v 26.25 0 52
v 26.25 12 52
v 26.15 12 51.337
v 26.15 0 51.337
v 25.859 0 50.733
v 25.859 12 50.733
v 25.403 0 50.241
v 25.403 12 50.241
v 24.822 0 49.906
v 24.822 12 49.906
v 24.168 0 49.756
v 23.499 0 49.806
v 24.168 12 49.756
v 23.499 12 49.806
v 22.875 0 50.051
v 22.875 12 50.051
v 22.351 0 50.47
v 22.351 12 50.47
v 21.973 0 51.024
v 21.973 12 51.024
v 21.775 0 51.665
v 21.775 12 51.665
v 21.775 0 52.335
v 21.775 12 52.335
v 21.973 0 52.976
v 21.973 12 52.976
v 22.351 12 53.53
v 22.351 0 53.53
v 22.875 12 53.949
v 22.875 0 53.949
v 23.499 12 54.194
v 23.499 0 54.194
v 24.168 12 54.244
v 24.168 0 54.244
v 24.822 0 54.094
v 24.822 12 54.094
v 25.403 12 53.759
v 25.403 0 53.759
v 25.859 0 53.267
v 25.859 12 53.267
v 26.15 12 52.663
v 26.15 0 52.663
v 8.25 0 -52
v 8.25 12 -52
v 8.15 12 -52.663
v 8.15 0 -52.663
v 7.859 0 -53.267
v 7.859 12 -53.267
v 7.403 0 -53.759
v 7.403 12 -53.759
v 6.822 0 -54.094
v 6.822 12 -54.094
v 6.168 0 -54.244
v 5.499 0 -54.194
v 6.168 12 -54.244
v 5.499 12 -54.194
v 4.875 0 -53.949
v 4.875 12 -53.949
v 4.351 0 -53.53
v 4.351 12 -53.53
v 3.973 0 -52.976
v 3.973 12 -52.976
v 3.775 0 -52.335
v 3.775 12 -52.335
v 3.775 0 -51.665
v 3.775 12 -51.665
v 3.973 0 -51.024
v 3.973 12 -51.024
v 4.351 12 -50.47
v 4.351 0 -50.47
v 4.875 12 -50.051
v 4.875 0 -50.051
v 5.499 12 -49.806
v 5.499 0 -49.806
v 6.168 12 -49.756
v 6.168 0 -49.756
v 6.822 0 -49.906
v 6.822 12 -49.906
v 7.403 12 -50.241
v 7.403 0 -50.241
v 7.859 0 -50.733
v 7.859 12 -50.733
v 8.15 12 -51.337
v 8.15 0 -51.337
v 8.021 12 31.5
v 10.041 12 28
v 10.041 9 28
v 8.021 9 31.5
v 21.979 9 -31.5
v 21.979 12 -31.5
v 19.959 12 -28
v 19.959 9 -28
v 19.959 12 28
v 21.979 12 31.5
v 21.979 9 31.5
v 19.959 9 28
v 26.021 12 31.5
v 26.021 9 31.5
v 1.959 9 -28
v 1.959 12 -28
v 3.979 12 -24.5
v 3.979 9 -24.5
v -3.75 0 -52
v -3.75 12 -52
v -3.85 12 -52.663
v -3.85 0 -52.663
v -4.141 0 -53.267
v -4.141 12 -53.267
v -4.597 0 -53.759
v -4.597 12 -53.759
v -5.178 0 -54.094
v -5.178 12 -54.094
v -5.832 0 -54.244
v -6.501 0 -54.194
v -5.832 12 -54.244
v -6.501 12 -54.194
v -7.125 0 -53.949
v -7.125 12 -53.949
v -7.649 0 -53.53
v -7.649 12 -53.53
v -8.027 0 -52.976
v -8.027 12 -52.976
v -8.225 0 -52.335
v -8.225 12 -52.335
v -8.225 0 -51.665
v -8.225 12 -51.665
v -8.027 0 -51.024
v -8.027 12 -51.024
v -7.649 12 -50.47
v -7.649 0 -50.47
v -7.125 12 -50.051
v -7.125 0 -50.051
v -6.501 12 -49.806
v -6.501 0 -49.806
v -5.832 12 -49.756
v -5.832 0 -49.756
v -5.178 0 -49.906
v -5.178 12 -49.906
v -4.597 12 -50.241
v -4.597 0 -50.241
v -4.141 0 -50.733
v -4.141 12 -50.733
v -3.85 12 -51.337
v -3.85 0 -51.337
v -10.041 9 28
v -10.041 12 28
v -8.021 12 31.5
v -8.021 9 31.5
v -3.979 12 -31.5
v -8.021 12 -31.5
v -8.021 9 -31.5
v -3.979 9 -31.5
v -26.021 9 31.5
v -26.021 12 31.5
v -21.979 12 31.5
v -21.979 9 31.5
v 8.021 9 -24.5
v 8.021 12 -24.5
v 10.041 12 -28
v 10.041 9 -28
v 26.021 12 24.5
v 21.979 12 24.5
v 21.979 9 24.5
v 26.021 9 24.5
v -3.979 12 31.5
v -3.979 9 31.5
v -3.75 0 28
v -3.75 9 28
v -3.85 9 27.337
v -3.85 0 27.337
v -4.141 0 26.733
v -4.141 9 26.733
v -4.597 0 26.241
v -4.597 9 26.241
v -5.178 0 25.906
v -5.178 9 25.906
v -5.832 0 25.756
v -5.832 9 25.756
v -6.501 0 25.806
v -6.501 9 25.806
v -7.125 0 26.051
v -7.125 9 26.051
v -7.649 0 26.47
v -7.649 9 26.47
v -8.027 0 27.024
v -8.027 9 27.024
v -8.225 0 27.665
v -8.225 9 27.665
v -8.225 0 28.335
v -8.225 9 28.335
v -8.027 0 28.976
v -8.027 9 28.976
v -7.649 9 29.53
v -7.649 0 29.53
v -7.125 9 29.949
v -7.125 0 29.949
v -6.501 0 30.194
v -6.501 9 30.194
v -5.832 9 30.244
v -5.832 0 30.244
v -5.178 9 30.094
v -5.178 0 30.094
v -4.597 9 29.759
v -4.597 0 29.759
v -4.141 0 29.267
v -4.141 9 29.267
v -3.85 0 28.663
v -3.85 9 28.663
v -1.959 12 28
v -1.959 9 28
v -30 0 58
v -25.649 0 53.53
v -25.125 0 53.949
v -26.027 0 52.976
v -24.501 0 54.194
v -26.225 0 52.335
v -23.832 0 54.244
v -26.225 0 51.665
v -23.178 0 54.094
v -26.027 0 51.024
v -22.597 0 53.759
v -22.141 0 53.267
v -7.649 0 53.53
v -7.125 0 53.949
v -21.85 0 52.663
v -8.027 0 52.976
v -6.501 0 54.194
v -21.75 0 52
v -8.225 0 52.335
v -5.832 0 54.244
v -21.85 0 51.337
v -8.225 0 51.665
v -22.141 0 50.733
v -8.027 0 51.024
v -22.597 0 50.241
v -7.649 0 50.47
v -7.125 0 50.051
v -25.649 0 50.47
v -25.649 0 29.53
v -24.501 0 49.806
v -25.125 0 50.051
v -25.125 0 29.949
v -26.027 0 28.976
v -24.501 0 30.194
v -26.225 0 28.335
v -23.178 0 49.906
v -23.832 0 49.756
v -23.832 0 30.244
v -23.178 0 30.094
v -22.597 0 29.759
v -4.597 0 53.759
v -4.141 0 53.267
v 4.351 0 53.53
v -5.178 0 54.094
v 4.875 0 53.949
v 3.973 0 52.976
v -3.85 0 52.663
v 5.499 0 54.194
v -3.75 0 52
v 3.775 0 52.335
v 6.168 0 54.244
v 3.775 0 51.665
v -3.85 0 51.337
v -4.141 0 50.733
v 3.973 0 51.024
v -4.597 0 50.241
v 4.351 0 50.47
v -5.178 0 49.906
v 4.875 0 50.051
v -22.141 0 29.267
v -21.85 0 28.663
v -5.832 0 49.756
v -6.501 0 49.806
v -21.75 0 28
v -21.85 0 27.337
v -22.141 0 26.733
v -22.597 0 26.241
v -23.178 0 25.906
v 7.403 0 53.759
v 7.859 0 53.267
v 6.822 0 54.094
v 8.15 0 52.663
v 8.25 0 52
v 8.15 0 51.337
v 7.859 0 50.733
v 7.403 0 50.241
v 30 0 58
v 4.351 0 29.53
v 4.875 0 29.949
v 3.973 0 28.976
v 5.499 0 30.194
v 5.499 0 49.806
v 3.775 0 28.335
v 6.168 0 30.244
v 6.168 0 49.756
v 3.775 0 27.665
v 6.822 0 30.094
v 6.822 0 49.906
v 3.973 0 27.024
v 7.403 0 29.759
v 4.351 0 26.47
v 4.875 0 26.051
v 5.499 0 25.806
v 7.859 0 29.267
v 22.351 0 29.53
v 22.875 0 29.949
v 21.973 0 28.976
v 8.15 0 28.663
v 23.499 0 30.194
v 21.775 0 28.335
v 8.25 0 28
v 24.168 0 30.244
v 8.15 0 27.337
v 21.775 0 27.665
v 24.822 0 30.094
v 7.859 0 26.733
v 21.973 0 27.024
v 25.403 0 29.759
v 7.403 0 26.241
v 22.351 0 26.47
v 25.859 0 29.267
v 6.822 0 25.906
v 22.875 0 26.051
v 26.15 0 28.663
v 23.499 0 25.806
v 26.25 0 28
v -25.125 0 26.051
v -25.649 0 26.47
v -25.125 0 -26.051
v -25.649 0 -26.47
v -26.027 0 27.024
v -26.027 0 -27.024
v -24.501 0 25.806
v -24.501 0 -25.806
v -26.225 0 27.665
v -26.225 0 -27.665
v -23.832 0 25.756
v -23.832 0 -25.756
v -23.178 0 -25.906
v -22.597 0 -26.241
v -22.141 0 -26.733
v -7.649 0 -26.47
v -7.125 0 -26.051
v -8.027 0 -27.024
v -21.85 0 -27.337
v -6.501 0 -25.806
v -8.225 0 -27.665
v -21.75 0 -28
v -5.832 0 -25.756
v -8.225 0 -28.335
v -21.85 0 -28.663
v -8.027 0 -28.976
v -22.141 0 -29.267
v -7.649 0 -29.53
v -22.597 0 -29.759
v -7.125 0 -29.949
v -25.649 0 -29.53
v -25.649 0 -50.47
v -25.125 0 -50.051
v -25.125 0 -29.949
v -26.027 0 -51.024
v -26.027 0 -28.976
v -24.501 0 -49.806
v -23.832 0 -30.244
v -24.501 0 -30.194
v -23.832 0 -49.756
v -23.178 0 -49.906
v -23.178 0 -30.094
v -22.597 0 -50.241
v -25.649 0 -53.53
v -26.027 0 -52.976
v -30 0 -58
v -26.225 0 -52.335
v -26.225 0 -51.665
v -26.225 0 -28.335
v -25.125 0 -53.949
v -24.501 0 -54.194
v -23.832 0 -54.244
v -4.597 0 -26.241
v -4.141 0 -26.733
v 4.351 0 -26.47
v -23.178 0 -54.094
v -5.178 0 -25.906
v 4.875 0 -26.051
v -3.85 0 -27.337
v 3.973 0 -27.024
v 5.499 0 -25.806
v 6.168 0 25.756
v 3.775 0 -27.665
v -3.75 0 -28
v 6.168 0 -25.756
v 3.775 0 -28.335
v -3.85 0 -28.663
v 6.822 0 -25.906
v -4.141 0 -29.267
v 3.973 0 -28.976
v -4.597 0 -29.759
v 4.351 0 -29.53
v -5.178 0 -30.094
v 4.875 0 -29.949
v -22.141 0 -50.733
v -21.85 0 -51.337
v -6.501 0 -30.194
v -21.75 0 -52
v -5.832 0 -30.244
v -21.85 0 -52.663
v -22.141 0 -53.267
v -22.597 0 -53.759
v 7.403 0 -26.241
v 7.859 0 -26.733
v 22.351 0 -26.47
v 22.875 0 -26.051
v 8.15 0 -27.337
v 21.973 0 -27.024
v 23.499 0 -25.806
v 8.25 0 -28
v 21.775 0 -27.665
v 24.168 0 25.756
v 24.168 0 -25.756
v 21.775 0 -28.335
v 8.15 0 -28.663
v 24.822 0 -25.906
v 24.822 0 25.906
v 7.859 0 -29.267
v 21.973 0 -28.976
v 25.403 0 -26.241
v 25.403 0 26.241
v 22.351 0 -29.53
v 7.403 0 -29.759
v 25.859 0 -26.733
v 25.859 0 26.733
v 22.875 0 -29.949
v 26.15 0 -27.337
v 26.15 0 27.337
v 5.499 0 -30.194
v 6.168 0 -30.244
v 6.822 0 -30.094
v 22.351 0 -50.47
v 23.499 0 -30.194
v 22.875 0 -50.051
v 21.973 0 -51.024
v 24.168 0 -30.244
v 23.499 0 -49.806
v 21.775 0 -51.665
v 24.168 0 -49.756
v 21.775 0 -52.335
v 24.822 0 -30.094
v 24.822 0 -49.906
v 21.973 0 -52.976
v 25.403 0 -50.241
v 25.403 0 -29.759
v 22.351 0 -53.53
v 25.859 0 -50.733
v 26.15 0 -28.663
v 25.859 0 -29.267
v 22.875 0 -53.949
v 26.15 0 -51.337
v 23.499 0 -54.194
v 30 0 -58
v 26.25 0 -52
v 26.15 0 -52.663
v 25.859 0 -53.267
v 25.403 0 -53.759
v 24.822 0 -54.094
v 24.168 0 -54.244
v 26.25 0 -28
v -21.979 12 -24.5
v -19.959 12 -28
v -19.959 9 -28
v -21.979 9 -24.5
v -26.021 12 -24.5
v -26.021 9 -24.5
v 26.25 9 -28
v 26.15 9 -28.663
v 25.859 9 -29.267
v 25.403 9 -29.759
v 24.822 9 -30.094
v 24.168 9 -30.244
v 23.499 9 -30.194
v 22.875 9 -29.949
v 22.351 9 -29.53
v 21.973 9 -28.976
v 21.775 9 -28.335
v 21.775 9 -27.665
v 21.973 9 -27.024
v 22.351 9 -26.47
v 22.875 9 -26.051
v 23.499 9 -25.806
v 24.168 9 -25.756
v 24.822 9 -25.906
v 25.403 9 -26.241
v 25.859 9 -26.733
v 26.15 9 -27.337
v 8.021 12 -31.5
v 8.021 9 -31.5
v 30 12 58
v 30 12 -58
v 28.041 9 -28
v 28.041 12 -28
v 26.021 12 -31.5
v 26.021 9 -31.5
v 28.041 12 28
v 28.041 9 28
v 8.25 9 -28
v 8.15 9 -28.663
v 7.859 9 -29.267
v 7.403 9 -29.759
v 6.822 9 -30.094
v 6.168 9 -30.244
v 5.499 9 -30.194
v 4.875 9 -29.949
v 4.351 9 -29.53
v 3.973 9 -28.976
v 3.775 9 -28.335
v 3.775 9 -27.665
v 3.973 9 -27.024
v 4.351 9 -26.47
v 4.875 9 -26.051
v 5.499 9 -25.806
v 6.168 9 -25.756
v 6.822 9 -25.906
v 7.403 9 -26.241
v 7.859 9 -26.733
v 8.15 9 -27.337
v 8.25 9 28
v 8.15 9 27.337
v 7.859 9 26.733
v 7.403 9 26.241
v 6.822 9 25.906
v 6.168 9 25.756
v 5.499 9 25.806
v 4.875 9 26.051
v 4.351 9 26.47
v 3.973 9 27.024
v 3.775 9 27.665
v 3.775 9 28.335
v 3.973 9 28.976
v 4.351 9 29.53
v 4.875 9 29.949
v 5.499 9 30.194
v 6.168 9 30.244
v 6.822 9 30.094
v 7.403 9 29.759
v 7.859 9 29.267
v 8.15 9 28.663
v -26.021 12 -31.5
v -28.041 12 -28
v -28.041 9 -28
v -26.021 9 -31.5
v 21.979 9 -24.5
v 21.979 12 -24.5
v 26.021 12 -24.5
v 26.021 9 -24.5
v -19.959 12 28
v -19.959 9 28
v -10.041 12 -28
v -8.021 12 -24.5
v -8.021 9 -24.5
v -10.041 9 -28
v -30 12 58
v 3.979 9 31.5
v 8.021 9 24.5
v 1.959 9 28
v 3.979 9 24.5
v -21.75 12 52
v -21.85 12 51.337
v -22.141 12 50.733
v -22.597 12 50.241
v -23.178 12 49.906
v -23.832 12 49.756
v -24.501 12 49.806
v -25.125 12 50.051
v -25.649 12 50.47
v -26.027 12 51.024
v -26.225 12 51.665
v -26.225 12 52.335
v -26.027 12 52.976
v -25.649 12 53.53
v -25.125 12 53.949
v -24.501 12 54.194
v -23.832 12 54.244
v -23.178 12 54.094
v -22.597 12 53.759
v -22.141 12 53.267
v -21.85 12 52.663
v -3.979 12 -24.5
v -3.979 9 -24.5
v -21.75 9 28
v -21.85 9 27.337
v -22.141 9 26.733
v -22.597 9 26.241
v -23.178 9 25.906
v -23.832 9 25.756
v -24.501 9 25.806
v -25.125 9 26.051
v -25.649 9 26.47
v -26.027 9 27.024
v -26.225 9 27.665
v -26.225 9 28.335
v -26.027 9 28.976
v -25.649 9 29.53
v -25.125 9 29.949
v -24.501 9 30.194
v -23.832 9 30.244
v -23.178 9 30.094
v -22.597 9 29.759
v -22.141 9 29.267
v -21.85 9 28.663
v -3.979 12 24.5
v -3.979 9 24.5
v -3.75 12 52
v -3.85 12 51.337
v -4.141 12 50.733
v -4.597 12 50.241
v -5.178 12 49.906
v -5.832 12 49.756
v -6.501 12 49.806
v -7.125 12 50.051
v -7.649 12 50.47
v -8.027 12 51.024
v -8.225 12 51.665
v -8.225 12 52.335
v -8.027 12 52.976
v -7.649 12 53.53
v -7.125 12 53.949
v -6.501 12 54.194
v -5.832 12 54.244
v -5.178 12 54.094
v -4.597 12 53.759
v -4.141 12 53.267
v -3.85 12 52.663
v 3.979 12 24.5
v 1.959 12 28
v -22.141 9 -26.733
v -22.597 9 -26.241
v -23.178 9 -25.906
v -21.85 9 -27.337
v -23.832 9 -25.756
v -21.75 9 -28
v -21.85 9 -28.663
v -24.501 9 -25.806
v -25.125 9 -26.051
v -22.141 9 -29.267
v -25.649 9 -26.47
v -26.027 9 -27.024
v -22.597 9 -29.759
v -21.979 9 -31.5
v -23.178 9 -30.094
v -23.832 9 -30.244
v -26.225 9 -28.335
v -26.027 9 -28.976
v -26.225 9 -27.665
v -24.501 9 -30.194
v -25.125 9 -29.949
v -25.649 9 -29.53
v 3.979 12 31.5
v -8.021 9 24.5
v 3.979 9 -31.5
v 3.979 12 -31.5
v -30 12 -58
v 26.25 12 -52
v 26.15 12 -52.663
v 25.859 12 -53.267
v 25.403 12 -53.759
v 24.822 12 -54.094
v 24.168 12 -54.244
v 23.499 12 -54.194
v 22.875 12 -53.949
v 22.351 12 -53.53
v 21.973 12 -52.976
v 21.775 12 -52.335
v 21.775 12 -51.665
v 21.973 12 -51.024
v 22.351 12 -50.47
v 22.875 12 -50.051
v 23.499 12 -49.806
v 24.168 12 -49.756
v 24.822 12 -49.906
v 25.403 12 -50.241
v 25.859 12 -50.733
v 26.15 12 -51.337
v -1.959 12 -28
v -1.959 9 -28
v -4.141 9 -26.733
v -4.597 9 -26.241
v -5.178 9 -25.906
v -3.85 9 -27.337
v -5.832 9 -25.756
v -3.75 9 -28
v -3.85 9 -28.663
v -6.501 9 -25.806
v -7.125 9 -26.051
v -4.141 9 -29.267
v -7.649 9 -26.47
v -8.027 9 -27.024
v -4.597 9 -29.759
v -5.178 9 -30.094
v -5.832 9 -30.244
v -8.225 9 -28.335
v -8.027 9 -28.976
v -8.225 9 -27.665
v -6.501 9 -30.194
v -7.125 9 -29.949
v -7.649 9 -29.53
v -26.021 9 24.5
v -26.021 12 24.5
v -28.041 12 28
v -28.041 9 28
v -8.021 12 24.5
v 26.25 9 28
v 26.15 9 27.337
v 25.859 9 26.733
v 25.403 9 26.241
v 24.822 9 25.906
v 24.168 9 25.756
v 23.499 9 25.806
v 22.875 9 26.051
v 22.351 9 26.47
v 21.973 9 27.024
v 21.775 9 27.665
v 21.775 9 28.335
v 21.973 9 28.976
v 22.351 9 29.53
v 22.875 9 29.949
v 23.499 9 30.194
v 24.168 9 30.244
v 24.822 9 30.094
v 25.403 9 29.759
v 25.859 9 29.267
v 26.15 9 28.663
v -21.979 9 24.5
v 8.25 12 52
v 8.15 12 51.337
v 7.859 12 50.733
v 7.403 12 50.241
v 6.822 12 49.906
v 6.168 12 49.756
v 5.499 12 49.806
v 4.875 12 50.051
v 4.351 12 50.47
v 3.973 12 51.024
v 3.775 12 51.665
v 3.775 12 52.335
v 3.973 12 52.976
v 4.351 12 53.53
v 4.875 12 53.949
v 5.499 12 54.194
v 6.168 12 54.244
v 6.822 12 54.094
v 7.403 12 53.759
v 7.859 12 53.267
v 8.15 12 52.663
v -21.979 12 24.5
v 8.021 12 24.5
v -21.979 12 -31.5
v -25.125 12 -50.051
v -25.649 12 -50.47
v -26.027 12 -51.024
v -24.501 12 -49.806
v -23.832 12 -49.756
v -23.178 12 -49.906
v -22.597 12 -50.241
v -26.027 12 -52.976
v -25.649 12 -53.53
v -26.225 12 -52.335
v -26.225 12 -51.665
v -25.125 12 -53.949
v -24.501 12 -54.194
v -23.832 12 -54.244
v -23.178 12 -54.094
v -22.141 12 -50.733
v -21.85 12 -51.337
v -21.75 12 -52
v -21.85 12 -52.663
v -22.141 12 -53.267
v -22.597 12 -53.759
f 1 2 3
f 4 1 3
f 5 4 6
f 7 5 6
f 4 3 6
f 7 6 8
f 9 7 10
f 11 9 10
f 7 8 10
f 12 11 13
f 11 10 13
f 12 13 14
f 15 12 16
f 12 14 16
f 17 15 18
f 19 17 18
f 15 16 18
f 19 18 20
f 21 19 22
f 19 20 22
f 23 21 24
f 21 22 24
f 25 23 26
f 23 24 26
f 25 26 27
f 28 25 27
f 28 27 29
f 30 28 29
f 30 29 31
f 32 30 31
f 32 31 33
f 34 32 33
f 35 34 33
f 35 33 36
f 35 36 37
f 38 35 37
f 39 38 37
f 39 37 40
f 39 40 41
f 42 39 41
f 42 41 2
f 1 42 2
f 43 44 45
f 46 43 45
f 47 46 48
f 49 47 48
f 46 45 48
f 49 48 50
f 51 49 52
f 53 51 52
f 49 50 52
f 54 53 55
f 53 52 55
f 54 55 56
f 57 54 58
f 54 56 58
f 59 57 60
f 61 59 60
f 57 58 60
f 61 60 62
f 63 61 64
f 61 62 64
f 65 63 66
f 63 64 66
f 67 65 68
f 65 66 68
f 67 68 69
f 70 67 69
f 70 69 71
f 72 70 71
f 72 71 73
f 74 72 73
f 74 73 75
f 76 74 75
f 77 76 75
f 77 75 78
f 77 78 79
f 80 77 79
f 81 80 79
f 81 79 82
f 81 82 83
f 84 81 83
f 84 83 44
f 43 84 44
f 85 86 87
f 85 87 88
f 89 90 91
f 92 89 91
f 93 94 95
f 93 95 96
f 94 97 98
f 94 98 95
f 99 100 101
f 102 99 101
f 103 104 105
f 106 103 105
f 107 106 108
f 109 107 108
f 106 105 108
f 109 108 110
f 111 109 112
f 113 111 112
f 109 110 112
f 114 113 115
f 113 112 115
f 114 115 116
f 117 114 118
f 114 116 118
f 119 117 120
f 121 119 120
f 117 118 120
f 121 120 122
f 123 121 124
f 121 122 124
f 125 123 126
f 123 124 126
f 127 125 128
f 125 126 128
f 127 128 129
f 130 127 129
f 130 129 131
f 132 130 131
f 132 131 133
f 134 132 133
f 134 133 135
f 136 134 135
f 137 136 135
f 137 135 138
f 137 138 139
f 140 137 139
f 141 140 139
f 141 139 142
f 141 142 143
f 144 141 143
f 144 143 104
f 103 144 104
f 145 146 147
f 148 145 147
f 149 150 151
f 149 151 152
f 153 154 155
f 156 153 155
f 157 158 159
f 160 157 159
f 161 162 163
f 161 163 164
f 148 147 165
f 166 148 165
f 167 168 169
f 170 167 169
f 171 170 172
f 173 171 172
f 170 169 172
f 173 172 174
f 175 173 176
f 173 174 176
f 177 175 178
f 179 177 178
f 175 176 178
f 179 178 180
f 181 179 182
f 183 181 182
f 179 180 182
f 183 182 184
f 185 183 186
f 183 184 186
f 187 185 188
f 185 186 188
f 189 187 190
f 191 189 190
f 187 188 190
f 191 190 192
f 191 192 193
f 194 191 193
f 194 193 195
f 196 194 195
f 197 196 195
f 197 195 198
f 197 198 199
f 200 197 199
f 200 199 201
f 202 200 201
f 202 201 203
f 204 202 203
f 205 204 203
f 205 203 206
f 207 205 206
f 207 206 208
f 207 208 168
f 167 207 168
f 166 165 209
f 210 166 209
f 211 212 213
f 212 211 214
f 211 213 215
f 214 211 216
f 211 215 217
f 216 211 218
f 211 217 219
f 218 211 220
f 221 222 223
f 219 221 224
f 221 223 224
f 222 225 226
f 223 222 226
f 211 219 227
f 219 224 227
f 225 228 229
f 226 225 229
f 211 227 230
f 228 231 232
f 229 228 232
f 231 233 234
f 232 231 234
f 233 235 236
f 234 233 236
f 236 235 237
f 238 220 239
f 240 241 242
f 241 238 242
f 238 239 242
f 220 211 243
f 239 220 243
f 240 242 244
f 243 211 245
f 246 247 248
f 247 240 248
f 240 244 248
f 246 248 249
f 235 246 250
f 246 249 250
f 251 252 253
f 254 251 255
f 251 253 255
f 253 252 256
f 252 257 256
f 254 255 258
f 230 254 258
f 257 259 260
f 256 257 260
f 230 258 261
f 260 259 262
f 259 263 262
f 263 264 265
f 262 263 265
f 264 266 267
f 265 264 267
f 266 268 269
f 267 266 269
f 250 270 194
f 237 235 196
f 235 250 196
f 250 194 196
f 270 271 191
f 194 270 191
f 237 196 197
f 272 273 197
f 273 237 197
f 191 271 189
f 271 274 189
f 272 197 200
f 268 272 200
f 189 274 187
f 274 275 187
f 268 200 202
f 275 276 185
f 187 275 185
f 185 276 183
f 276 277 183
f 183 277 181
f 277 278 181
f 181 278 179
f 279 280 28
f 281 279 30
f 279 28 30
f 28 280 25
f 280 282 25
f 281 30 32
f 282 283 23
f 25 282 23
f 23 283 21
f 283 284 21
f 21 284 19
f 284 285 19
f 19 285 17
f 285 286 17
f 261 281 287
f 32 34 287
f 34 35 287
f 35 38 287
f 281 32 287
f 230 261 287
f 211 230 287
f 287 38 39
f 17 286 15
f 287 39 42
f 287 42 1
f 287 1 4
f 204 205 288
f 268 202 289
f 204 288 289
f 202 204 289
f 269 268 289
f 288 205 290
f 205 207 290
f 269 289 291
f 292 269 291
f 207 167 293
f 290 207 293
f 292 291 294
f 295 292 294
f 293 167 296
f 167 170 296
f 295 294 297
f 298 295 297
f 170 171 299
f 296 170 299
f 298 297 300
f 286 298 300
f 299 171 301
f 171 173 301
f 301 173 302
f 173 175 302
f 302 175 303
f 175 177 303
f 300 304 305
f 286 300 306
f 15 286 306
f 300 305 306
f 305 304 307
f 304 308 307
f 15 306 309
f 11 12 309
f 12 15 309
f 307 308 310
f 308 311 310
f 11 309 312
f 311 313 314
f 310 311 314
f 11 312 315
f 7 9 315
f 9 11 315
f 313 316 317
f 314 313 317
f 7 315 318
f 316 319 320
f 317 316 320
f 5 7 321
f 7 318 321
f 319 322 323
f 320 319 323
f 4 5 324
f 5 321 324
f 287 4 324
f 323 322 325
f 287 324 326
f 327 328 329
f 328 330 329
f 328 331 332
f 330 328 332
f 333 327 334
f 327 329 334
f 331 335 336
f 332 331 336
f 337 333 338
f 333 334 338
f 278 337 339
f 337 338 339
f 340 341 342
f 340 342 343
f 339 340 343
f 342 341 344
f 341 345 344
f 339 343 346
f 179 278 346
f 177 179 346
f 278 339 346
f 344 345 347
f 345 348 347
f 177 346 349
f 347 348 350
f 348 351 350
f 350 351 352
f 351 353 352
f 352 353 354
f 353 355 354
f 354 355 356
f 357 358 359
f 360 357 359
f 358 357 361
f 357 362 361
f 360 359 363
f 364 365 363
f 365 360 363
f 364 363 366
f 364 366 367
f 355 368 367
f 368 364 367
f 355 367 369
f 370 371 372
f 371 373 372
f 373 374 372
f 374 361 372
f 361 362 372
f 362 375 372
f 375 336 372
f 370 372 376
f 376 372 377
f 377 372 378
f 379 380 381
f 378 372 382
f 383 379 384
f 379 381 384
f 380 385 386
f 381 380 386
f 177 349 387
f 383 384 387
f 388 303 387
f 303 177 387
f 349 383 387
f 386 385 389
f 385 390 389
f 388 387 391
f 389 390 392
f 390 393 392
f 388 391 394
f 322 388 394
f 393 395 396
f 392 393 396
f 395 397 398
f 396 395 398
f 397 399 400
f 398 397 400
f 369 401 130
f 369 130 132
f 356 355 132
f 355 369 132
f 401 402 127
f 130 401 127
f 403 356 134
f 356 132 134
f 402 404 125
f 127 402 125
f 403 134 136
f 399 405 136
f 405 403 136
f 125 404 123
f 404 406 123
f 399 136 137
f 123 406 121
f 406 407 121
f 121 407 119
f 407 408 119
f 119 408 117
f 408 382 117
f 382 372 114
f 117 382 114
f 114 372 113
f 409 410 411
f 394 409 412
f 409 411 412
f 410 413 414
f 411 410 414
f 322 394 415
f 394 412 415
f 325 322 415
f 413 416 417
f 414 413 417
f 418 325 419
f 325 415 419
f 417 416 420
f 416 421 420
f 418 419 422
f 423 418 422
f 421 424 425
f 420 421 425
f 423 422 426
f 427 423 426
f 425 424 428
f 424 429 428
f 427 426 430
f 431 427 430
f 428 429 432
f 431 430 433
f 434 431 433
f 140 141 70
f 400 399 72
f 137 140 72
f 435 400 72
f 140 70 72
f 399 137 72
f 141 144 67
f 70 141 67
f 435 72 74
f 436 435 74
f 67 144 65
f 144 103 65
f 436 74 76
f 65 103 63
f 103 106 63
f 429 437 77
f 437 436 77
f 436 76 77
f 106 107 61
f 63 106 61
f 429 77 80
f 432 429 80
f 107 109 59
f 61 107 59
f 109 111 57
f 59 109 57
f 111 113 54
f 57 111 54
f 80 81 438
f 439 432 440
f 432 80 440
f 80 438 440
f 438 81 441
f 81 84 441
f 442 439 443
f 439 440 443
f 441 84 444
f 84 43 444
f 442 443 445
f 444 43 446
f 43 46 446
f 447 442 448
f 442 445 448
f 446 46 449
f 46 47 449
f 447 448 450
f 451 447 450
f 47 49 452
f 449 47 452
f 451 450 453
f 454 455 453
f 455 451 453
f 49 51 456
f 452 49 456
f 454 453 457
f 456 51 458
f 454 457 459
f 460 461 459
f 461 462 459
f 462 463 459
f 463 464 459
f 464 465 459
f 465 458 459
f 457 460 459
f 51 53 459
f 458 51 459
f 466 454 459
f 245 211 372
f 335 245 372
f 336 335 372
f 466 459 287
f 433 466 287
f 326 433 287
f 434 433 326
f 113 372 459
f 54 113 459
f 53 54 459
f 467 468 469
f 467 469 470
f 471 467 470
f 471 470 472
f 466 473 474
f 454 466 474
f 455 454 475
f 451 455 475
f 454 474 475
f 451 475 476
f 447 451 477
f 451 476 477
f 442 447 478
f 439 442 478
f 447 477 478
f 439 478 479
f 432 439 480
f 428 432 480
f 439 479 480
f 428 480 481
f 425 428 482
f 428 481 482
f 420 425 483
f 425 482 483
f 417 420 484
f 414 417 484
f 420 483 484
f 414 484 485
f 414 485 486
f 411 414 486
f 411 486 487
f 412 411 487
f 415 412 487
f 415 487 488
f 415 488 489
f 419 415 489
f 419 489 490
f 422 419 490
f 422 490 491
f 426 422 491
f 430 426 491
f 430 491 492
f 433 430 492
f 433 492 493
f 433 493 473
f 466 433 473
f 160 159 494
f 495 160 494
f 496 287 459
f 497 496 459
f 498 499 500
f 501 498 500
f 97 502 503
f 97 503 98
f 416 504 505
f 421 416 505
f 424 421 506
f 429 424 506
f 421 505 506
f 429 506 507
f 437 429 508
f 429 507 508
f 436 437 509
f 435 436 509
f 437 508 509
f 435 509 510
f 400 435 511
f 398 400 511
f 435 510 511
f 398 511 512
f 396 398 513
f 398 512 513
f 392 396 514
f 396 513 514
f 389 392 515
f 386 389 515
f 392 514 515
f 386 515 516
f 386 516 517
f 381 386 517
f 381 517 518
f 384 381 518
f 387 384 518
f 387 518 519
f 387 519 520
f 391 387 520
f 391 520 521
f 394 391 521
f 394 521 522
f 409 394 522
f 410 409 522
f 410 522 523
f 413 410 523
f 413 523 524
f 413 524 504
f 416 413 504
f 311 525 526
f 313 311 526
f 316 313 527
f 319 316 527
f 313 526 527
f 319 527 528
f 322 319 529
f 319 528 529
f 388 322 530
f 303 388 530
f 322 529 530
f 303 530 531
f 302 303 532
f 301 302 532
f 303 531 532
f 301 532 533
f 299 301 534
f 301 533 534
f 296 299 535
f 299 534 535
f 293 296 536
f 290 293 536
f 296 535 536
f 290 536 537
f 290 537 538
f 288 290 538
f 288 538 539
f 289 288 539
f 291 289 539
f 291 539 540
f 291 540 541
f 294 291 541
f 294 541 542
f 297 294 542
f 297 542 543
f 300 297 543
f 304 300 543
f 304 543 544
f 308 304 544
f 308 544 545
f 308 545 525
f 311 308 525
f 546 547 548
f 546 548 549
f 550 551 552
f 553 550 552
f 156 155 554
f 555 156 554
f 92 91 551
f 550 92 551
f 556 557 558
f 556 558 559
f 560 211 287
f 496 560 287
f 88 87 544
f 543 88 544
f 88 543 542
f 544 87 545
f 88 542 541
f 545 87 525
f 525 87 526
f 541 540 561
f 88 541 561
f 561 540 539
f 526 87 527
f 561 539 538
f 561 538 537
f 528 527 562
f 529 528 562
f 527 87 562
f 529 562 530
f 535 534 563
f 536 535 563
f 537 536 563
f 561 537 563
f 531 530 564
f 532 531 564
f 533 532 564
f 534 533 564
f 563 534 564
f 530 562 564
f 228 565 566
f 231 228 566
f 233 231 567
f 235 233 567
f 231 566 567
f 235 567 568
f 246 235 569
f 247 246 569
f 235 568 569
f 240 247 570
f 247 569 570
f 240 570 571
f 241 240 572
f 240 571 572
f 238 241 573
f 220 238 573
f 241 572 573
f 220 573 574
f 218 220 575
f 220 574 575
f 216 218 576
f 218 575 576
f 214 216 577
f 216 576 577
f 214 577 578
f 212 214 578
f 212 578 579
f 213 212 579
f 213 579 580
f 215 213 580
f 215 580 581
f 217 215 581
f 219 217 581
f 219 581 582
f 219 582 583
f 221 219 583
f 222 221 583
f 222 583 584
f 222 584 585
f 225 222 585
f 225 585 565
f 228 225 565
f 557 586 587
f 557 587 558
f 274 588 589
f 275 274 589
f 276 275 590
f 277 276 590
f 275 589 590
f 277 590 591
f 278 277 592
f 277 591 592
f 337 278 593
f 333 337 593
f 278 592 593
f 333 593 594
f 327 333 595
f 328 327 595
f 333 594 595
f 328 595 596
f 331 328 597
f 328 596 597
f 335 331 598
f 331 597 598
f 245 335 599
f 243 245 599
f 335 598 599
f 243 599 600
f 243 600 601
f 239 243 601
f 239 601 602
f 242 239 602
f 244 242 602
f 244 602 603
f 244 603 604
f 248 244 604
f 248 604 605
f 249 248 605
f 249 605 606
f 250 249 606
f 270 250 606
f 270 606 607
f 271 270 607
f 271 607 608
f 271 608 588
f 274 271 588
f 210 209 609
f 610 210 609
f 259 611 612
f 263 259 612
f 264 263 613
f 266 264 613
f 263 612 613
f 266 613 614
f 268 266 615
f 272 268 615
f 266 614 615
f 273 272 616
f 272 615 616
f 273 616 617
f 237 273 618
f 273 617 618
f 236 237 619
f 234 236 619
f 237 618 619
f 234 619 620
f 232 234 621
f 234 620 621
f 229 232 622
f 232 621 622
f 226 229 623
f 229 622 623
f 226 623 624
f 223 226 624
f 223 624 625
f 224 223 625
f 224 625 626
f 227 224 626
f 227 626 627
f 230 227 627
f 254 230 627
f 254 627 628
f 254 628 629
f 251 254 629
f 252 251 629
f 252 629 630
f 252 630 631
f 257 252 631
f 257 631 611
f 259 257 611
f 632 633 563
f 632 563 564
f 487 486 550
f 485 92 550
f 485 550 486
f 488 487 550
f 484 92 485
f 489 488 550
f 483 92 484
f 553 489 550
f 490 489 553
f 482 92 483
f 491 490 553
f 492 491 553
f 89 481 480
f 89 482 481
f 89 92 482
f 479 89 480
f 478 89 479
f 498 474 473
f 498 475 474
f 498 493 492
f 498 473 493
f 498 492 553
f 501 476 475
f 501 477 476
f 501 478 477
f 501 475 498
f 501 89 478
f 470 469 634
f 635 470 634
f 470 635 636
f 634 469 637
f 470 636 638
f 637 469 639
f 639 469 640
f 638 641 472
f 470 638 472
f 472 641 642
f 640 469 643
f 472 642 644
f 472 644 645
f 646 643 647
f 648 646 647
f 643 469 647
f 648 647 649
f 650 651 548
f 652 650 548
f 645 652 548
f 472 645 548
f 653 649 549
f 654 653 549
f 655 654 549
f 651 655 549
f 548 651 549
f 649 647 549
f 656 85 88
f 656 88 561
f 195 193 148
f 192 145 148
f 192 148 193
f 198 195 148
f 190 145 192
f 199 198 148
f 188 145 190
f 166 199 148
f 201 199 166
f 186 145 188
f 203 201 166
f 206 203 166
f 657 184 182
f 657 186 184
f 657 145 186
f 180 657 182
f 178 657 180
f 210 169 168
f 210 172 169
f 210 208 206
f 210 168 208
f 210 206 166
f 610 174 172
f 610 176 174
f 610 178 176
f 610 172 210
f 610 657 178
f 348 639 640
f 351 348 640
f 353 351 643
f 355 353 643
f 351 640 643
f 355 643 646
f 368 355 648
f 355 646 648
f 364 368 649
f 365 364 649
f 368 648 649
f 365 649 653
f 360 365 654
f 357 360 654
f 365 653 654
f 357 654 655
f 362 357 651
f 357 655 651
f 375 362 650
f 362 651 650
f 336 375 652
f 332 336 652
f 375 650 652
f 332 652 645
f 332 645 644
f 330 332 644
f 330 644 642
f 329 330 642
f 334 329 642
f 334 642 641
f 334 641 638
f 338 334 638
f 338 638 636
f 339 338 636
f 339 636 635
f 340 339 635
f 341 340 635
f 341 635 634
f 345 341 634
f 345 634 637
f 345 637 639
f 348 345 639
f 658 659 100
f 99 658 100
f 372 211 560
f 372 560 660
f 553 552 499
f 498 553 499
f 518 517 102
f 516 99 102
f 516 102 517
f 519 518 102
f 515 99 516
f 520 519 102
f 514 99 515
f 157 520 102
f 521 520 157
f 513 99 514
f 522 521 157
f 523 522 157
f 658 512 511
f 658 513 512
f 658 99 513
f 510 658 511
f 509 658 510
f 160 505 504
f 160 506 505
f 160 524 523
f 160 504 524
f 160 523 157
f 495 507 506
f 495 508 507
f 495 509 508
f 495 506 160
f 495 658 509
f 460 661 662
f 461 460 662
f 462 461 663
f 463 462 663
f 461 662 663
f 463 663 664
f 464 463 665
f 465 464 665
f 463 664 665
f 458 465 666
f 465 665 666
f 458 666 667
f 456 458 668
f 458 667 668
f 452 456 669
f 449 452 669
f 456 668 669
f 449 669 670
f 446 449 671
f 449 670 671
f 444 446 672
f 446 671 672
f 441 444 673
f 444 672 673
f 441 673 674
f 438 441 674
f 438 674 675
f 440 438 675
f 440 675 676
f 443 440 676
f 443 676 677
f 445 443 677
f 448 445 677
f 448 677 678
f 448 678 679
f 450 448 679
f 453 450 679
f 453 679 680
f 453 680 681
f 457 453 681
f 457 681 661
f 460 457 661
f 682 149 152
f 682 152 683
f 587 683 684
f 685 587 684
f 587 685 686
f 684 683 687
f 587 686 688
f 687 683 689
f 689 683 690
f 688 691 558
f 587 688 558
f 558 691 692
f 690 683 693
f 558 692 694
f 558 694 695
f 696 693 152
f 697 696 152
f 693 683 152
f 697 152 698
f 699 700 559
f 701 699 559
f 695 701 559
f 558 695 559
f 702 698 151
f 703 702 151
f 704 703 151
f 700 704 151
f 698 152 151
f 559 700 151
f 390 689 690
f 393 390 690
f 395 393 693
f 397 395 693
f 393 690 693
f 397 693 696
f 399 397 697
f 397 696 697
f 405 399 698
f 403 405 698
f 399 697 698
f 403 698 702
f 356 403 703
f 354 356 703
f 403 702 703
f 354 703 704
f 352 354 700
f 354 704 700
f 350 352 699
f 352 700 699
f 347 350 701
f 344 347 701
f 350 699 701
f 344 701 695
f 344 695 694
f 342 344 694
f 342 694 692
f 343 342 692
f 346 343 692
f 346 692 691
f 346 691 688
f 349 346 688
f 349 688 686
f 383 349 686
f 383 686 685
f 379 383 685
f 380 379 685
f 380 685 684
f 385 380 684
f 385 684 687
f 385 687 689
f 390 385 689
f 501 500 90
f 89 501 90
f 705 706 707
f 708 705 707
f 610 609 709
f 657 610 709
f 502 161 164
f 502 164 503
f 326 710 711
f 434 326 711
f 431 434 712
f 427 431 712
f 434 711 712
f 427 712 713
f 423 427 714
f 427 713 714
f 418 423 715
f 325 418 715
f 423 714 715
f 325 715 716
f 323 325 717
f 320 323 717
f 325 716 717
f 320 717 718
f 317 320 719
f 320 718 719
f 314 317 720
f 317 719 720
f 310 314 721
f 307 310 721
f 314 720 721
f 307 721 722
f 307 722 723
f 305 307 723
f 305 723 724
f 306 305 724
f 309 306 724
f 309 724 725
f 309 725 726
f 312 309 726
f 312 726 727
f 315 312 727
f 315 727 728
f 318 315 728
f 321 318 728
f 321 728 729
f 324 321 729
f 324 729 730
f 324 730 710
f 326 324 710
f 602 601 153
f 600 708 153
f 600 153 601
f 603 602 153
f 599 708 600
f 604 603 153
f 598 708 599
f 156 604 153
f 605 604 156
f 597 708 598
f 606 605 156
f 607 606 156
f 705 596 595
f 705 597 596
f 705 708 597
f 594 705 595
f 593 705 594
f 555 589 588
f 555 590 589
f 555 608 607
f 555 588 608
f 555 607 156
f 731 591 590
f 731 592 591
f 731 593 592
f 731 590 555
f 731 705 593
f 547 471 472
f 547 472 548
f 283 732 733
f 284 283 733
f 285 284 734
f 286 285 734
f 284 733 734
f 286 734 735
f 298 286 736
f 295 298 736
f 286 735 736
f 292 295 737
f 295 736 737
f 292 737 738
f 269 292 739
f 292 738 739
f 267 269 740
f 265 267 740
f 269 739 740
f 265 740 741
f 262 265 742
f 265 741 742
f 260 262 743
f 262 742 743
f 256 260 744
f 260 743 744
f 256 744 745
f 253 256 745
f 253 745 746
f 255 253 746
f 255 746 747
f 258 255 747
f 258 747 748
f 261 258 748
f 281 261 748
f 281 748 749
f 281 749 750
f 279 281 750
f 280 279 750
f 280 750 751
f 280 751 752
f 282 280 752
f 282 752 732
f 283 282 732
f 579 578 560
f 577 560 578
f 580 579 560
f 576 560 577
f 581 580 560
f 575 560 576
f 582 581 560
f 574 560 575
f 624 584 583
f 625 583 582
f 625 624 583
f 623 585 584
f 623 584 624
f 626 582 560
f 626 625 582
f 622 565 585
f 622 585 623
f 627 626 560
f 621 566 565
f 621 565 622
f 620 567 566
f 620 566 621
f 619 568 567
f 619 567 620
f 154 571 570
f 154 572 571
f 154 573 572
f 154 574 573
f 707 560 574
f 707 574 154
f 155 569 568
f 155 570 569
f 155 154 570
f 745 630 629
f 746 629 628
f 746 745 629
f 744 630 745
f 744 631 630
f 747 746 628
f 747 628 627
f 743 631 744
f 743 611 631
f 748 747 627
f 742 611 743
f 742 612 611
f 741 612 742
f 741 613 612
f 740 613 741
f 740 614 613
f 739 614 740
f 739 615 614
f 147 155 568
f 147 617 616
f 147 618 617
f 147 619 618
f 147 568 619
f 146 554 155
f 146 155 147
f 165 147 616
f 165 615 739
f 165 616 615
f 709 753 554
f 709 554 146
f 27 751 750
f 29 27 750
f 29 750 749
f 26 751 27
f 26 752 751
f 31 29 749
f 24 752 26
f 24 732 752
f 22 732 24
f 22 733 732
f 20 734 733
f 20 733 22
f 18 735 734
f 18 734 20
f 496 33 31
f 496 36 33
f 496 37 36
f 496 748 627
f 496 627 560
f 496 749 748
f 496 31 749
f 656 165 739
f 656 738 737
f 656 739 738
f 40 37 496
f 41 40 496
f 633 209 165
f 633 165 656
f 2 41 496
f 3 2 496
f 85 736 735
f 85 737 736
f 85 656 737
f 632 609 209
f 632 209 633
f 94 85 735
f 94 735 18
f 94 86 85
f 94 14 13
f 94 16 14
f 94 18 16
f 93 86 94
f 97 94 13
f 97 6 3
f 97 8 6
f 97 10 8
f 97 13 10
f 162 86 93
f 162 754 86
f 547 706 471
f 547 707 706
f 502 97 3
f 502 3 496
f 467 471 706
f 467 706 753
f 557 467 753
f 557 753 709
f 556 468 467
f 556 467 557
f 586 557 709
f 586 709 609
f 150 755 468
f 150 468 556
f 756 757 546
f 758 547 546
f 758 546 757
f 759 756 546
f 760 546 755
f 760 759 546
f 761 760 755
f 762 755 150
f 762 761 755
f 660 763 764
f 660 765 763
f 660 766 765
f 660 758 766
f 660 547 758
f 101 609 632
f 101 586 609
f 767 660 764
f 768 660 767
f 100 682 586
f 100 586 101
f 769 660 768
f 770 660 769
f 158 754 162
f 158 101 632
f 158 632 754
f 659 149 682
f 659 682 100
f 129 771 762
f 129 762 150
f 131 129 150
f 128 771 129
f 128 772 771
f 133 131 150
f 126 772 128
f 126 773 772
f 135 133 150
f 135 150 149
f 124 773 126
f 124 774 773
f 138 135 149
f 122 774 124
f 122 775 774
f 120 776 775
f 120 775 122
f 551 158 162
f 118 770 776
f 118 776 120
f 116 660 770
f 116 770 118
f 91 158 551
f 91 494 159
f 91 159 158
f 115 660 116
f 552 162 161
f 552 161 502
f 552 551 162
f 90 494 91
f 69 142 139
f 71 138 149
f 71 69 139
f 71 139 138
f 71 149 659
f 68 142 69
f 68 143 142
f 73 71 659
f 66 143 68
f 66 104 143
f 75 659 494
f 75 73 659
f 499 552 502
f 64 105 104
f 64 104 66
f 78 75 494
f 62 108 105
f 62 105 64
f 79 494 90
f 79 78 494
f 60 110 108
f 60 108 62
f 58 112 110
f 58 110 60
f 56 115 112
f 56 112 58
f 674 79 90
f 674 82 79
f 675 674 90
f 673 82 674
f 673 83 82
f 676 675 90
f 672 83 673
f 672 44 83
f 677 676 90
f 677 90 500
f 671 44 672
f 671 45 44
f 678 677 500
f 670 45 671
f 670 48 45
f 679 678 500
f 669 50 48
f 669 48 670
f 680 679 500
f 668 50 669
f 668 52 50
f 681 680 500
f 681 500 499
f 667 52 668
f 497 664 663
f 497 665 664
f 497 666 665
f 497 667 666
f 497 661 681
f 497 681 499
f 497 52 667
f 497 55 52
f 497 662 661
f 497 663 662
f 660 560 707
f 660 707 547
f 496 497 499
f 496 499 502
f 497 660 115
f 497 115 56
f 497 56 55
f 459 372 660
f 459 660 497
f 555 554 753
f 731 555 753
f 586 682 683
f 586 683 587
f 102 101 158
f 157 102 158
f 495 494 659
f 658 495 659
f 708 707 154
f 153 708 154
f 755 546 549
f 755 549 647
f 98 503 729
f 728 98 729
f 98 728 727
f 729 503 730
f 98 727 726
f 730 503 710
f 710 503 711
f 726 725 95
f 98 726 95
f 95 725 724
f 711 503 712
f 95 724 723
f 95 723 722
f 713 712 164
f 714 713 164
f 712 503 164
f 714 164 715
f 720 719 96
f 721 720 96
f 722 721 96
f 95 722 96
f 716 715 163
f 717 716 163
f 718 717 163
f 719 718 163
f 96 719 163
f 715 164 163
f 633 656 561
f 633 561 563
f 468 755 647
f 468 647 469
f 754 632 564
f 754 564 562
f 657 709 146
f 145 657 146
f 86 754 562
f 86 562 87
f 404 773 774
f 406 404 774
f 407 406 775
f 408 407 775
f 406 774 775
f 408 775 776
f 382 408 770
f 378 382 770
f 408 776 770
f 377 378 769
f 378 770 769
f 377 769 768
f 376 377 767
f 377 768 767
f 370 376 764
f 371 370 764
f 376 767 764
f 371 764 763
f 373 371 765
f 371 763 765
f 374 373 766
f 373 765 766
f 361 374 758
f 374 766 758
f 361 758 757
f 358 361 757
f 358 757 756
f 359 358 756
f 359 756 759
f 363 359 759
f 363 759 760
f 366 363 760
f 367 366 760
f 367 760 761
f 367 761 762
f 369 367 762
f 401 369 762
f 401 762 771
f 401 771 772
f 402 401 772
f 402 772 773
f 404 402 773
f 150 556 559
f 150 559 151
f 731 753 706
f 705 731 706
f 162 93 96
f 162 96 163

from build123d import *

# Parameters (mm, degrees)
SKETCH1_W                      = 60
SKETCH1_H                      = 116
BOSS_EXTRUDE1_DEPTH            = 12
CUT_EXTRUDE1_REACH             = 14
SKETCH2_R                      = 2.25
CUT_EXTRUDE1_DIRECTION_2_DEPTH = 1
CUT_EXTRUDE2_DEPTH             = 1
CUT_EXTRUDE2_DEPTH_BACK        = 3


with BuildPart() as part:
    # Sketch1 → Boss-Extrude1 (new body)
    with BuildSketch(Plane(origin=(0, 0, 0), x_dir=(1, 0, 0), z_dir=(0, 1, 0))):
        Rectangle(SKETCH1_W, SKETCH1_H)
    extrude(amount=BOSS_EXTRUDE1_DEPTH)

    # Sketch2 → Cut-Extrude1 (cut, up to next)
    with BuildSketch(Plane(origin=(0, 12, 0), x_dir=(1, 0, 0), z_dir=(0, 1, 0)), mode=Mode.PRIVATE) as cut_extrude1_sk1:
        with Locations((-24, 52)):
            Circle(SKETCH2_R)
    cut_extrude1_tool1 = extrude(cut_extrude1_sk1.sketch, amount=-CUT_EXTRUDE1_REACH, mode=Mode.PRIVATE) & part.part
    add(cut_extrude1_tool1.solids().sort_by_distance((-24, 12, -52))[0], mode=Mode.SUBTRACT)
    # Sketch2 → Cut-Extrude1 (cut, up to next)
    with BuildSketch(Plane(origin=(0, 12, 0), x_dir=(1, 0, 0), z_dir=(0, 1, 0)), mode=Mode.PRIVATE) as cut_extrude1_sk2:
        with Locations((-6, 52)):
            Circle(SKETCH2_R)
    cut_extrude1_tool2 = extrude(cut_extrude1_sk2.sketch, amount=-CUT_EXTRUDE1_REACH, mode=Mode.PRIVATE) & part.part
    add(cut_extrude1_tool2.solids().sort_by_distance((-6, 12, -52))[0], mode=Mode.SUBTRACT)
    # Sketch2 → Cut-Extrude1 (cut, up to next)
    with BuildSketch(Plane(origin=(0, 12, 0), x_dir=(1, 0, 0), z_dir=(0, 1, 0)), mode=Mode.PRIVATE) as cut_extrude1_sk3:
        with Locations((-24, 28)):
            Circle(SKETCH2_R)
    cut_extrude1_tool3 = extrude(cut_extrude1_sk3.sketch, amount=-CUT_EXTRUDE1_REACH, mode=Mode.PRIVATE) & part.part
    add(cut_extrude1_tool3.solids().sort_by_distance((-24, 12, -28))[0], mode=Mode.SUBTRACT)
    # Sketch2 → Cut-Extrude1 (cut, up to next)
    with BuildSketch(Plane(origin=(0, 12, 0), x_dir=(1, 0, 0), z_dir=(0, 1, 0)), mode=Mode.PRIVATE) as cut_extrude1_sk4:
        with Locations((-6, 28)):
            Circle(SKETCH2_R)
    cut_extrude1_tool4 = extrude(cut_extrude1_sk4.sketch, amount=-CUT_EXTRUDE1_REACH, mode=Mode.PRIVATE) & part.part
    add(cut_extrude1_tool4.solids().sort_by_distance((-6, 12, -28))[0], mode=Mode.SUBTRACT)
    # Sketch2 → Cut-Extrude1 (cut, up to next)
    with BuildSketch(Plane(origin=(0, 12, 0), x_dir=(1, 0, 0), z_dir=(0, 1, 0)), mode=Mode.PRIVATE) as cut_extrude1_sk5:
        with Locations((6, 28)):
            Circle(SKETCH2_R)
    cut_extrude1_tool5 = extrude(cut_extrude1_sk5.sketch, amount=-CUT_EXTRUDE1_REACH, mode=Mode.PRIVATE) & part.part
    add(cut_extrude1_tool5.solids().sort_by_distance((6, 12, -28))[0], mode=Mode.SUBTRACT)
    # Sketch2 → Cut-Extrude1 (cut, up to next)
    with BuildSketch(Plane(origin=(0, 12, 0), x_dir=(1, 0, 0), z_dir=(0, 1, 0)), mode=Mode.PRIVATE) as cut_extrude1_sk6:
        with Locations((24, 28)):
            Circle(SKETCH2_R)
    cut_extrude1_tool6 = extrude(cut_extrude1_sk6.sketch, amount=-CUT_EXTRUDE1_REACH, mode=Mode.PRIVATE) & part.part
    add(cut_extrude1_tool6.solids().sort_by_distance((24, 12, -28))[0], mode=Mode.SUBTRACT)
    # Sketch2 → Cut-Extrude1 (cut, up to next)
    with BuildSketch(Plane(origin=(0, 12, 0), x_dir=(1, 0, 0), z_dir=(0, 1, 0)), mode=Mode.PRIVATE) as cut_extrude1_sk7:
        with Locations((6, 52)):
            Circle(SKETCH2_R)
    cut_extrude1_tool7 = extrude(cut_extrude1_sk7.sketch, amount=-CUT_EXTRUDE1_REACH, mode=Mode.PRIVATE) & part.part
    add(cut_extrude1_tool7.solids().sort_by_distance((6, 12, -52))[0], mode=Mode.SUBTRACT)
    # Sketch2 → Cut-Extrude1 (cut, up to next)
    with BuildSketch(Plane(origin=(0, 12, 0), x_dir=(1, 0, 0), z_dir=(0, 1, 0)), mode=Mode.PRIVATE) as cut_extrude1_sk8:
        with Locations((24, 52)):
            Circle(SKETCH2_R)
    cut_extrude1_tool8 = extrude(cut_extrude1_sk8.sketch, amount=-CUT_EXTRUDE1_REACH, mode=Mode.PRIVATE) & part.part
    add(cut_extrude1_tool8.solids().sort_by_distance((24, 12, -52))[0], mode=Mode.SUBTRACT)
    # Sketch2 → Cut-Extrude1 (cut, up to next)
    with BuildSketch(Plane(origin=(0, 12, 0), x_dir=(1, 0, 0), z_dir=(0, 1, 0)), mode=Mode.PRIVATE) as cut_extrude1_sk9:
        with Locations((24, -52)):
            Circle(SKETCH2_R)
    cut_extrude1_tool9 = extrude(cut_extrude1_sk9.sketch, amount=-CUT_EXTRUDE1_REACH, mode=Mode.PRIVATE) & part.part
    add(cut_extrude1_tool9.solids().sort_by_distance((24, 12, 52))[0], mode=Mode.SUBTRACT)
    # Sketch2 → Cut-Extrude1 (cut, up to next)
    with BuildSketch(Plane(origin=(0, 12, 0), x_dir=(1, 0, 0), z_dir=(0, 1, 0)), mode=Mode.PRIVATE) as cut_extrude1_sk10:
        with Locations((6, -52)):
            Circle(SKETCH2_R)
    cut_extrude1_tool10 = extrude(cut_extrude1_sk10.sketch, amount=-CUT_EXTRUDE1_REACH, mode=Mode.PRIVATE) & part.part
    add(cut_extrude1_tool10.solids().sort_by_distance((6, 12, 52))[0], mode=Mode.SUBTRACT)
    # Sketch2 → Cut-Extrude1 (cut, up to next)
    with BuildSketch(Plane(origin=(0, 12, 0), x_dir=(1, 0, 0), z_dir=(0, 1, 0)), mode=Mode.PRIVATE) as cut_extrude1_sk11:
        with Locations((24, -28)):
            Circle(SKETCH2_R)
    cut_extrude1_tool11 = extrude(cut_extrude1_sk11.sketch, amount=-CUT_EXTRUDE1_REACH, mode=Mode.PRIVATE) & part.part
    add(cut_extrude1_tool11.solids().sort_by_distance((24, 12, 28))[0], mode=Mode.SUBTRACT)
    # Sketch2 → Cut-Extrude1 (cut, up to next)
    with BuildSketch(Plane(origin=(0, 12, 0), x_dir=(1, 0, 0), z_dir=(0, 1, 0)), mode=Mode.PRIVATE) as cut_extrude1_sk12:
        with Locations((6, -28)):
            Circle(SKETCH2_R)
    cut_extrude1_tool12 = extrude(cut_extrude1_sk12.sketch, amount=-CUT_EXTRUDE1_REACH, mode=Mode.PRIVATE) & part.part
    add(cut_extrude1_tool12.solids().sort_by_distance((6, 12, 28))[0], mode=Mode.SUBTRACT)
    # Sketch2 → Cut-Extrude1 (cut, up to next)
    with BuildSketch(Plane(origin=(0, 12, 0), x_dir=(1, 0, 0), z_dir=(0, 1, 0)), mode=Mode.PRIVATE) as cut_extrude1_sk13:
        with Locations((-6, -28)):
            Circle(SKETCH2_R)
    cut_extrude1_tool13 = extrude(cut_extrude1_sk13.sketch, amount=-CUT_EXTRUDE1_REACH, mode=Mode.PRIVATE) & part.part
    add(cut_extrude1_tool13.solids().sort_by_distance((-6, 12, 28))[0], mode=Mode.SUBTRACT)
    # Sketch2 → Cut-Extrude1 (cut, up to next)
    with BuildSketch(Plane(origin=(0, 12, 0), x_dir=(1, 0, 0), z_dir=(0, 1, 0)), mode=Mode.PRIVATE) as cut_extrude1_sk14:
        with Locations((-24, -28)):
            Circle(SKETCH2_R)
    cut_extrude1_tool14 = extrude(cut_extrude1_sk14.sketch, amount=-CUT_EXTRUDE1_REACH, mode=Mode.PRIVATE) & part.part
    add(cut_extrude1_tool14.solids().sort_by_distance((-24, 12, 28))[0], mode=Mode.SUBTRACT)
    # Sketch2 → Cut-Extrude1 (cut, up to next)
    with BuildSketch(Plane(origin=(0, 12, 0), x_dir=(1, 0, 0), z_dir=(0, 1, 0)), mode=Mode.PRIVATE) as cut_extrude1_sk15:
        with Locations((-6, -52)):
            Circle(SKETCH2_R)
    cut_extrude1_tool15 = extrude(cut_extrude1_sk15.sketch, amount=-CUT_EXTRUDE1_REACH, mode=Mode.PRIVATE) & part.part
    add(cut_extrude1_tool15.solids().sort_by_distance((-6, 12, 52))[0], mode=Mode.SUBTRACT)
    # Sketch2 → Cut-Extrude1 (cut, up to next)
    with BuildSketch(Plane(origin=(0, 12, 0), x_dir=(1, 0, 0), z_dir=(0, 1, 0)), mode=Mode.PRIVATE) as cut_extrude1_sk16:
        with Locations((-24, -52)):
            Circle(SKETCH2_R)
    cut_extrude1_tool16 = extrude(cut_extrude1_sk16.sketch, amount=-CUT_EXTRUDE1_REACH, mode=Mode.PRIVATE) & part.part
    add(cut_extrude1_tool16.solids().sort_by_distance((-24, 12, 52))[0], mode=Mode.SUBTRACT)

    # Sketch2 → Cut-Extrude1 direction 2 (cut)
    with BuildSketch(Plane(origin=(0, 12, 0), x_dir=(1, 0, 0), z_dir=(0, 1, 0))):
        with Locations((-24, 52)):
            Circle(SKETCH2_R)
        with Locations((-6, 52)):
            Circle(SKETCH2_R)
        with Locations((-24, 28)):
            Circle(SKETCH2_R)
        with Locations((-6, 28)):
            Circle(SKETCH2_R)
        with Locations((6, 28)):
            Circle(SKETCH2_R)
        with Locations((24, 28)):
            Circle(SKETCH2_R)
        with Locations((6, 52)):
            Circle(SKETCH2_R)
        with Locations((24, 52)):
            Circle(SKETCH2_R)
        with Locations((24, -52)):
            Circle(SKETCH2_R)
        with Locations((6, -52)):
            Circle(SKETCH2_R)
        with Locations((24, -28)):
            Circle(SKETCH2_R)
        with Locations((6, -28)):
            Circle(SKETCH2_R)
        with Locations((-6, -28)):
            Circle(SKETCH2_R)
        with Locations((-24, -28)):
            Circle(SKETCH2_R)
        with Locations((-6, -52)):
            Circle(SKETCH2_R)
        with Locations((-24, -52)):
            Circle(SKETCH2_R)
    extrude(amount=CUT_EXTRUDE1_DIRECTION_2_DEPTH, mode=Mode.SUBTRACT)

    # Sketch3 → Cut-Extrude2 (cut, two sides)
    with BuildSketch(Plane(origin=(0, 12, 0), x_dir=(1, 0, 0), z_dir=(0, 1, 0))) as cut_extrude2_sk:
        Polygon((-19.958548116, -28), (-21.979274058, -24.5), (-26.020725942, -24.5), (-28.041451884, -28), (-26.020725942, -31.5), (-21.979274058, -31.5), align=None)
        Polygon((-1.958548116, -28), (-3.979274058, -24.5), (-8.020725942, -24.5), (-10.041451884, -28), (-8.020725942, -31.5), (-3.979274058, -31.5), align=None)
        Polygon((3.979274058, -31.5), (1.958548116, -28), (3.979274058, -24.5), (8.020725942, -24.5), (10.041451884, -28), (8.020725942, -31.5), align=None)
        Polygon((21.979274058, -31.5), (19.958548116, -28), (21.979274058, -24.5), (26.020725942, -24.5), (28.041451884, -28), (26.020725942, -31.5), align=None)
        Polygon((26.020725942, 31.5), (21.979274058, 31.5), (19.958548116, 28), (21.979274058, 24.5), (26.020725942, 24.5), (28.041451884, 28), align=None)
        Polygon((8.020725942, 31.5), (3.979274058, 31.5), (1.958548116, 28), (3.979274058, 24.5), (8.020725942, 24.5), (10.041451884, 28), align=None)
        Polygon((-3.979274058, 31.5), (-1.958548116, 28), (-3.979274058, 24.5), (-8.020725942, 24.5), (-10.041451884, 28), (-8.020725942, 31.5), align=None)
        Polygon((-21.979274058, 31.5), (-19.958548116, 28), (-21.979274058, 24.5), (-26.020725942, 24.5), (-28.041451884, 28), (-26.020725942, 31.5), align=None)
    extrude(amount=CUT_EXTRUDE2_DEPTH, mode=Mode.SUBTRACT)
    extrude(cut_extrude2_sk.sketch, amount=-CUT_EXTRUDE2_DEPTH_BACK, mode=Mode.SUBTRACT)


solid = part.part
